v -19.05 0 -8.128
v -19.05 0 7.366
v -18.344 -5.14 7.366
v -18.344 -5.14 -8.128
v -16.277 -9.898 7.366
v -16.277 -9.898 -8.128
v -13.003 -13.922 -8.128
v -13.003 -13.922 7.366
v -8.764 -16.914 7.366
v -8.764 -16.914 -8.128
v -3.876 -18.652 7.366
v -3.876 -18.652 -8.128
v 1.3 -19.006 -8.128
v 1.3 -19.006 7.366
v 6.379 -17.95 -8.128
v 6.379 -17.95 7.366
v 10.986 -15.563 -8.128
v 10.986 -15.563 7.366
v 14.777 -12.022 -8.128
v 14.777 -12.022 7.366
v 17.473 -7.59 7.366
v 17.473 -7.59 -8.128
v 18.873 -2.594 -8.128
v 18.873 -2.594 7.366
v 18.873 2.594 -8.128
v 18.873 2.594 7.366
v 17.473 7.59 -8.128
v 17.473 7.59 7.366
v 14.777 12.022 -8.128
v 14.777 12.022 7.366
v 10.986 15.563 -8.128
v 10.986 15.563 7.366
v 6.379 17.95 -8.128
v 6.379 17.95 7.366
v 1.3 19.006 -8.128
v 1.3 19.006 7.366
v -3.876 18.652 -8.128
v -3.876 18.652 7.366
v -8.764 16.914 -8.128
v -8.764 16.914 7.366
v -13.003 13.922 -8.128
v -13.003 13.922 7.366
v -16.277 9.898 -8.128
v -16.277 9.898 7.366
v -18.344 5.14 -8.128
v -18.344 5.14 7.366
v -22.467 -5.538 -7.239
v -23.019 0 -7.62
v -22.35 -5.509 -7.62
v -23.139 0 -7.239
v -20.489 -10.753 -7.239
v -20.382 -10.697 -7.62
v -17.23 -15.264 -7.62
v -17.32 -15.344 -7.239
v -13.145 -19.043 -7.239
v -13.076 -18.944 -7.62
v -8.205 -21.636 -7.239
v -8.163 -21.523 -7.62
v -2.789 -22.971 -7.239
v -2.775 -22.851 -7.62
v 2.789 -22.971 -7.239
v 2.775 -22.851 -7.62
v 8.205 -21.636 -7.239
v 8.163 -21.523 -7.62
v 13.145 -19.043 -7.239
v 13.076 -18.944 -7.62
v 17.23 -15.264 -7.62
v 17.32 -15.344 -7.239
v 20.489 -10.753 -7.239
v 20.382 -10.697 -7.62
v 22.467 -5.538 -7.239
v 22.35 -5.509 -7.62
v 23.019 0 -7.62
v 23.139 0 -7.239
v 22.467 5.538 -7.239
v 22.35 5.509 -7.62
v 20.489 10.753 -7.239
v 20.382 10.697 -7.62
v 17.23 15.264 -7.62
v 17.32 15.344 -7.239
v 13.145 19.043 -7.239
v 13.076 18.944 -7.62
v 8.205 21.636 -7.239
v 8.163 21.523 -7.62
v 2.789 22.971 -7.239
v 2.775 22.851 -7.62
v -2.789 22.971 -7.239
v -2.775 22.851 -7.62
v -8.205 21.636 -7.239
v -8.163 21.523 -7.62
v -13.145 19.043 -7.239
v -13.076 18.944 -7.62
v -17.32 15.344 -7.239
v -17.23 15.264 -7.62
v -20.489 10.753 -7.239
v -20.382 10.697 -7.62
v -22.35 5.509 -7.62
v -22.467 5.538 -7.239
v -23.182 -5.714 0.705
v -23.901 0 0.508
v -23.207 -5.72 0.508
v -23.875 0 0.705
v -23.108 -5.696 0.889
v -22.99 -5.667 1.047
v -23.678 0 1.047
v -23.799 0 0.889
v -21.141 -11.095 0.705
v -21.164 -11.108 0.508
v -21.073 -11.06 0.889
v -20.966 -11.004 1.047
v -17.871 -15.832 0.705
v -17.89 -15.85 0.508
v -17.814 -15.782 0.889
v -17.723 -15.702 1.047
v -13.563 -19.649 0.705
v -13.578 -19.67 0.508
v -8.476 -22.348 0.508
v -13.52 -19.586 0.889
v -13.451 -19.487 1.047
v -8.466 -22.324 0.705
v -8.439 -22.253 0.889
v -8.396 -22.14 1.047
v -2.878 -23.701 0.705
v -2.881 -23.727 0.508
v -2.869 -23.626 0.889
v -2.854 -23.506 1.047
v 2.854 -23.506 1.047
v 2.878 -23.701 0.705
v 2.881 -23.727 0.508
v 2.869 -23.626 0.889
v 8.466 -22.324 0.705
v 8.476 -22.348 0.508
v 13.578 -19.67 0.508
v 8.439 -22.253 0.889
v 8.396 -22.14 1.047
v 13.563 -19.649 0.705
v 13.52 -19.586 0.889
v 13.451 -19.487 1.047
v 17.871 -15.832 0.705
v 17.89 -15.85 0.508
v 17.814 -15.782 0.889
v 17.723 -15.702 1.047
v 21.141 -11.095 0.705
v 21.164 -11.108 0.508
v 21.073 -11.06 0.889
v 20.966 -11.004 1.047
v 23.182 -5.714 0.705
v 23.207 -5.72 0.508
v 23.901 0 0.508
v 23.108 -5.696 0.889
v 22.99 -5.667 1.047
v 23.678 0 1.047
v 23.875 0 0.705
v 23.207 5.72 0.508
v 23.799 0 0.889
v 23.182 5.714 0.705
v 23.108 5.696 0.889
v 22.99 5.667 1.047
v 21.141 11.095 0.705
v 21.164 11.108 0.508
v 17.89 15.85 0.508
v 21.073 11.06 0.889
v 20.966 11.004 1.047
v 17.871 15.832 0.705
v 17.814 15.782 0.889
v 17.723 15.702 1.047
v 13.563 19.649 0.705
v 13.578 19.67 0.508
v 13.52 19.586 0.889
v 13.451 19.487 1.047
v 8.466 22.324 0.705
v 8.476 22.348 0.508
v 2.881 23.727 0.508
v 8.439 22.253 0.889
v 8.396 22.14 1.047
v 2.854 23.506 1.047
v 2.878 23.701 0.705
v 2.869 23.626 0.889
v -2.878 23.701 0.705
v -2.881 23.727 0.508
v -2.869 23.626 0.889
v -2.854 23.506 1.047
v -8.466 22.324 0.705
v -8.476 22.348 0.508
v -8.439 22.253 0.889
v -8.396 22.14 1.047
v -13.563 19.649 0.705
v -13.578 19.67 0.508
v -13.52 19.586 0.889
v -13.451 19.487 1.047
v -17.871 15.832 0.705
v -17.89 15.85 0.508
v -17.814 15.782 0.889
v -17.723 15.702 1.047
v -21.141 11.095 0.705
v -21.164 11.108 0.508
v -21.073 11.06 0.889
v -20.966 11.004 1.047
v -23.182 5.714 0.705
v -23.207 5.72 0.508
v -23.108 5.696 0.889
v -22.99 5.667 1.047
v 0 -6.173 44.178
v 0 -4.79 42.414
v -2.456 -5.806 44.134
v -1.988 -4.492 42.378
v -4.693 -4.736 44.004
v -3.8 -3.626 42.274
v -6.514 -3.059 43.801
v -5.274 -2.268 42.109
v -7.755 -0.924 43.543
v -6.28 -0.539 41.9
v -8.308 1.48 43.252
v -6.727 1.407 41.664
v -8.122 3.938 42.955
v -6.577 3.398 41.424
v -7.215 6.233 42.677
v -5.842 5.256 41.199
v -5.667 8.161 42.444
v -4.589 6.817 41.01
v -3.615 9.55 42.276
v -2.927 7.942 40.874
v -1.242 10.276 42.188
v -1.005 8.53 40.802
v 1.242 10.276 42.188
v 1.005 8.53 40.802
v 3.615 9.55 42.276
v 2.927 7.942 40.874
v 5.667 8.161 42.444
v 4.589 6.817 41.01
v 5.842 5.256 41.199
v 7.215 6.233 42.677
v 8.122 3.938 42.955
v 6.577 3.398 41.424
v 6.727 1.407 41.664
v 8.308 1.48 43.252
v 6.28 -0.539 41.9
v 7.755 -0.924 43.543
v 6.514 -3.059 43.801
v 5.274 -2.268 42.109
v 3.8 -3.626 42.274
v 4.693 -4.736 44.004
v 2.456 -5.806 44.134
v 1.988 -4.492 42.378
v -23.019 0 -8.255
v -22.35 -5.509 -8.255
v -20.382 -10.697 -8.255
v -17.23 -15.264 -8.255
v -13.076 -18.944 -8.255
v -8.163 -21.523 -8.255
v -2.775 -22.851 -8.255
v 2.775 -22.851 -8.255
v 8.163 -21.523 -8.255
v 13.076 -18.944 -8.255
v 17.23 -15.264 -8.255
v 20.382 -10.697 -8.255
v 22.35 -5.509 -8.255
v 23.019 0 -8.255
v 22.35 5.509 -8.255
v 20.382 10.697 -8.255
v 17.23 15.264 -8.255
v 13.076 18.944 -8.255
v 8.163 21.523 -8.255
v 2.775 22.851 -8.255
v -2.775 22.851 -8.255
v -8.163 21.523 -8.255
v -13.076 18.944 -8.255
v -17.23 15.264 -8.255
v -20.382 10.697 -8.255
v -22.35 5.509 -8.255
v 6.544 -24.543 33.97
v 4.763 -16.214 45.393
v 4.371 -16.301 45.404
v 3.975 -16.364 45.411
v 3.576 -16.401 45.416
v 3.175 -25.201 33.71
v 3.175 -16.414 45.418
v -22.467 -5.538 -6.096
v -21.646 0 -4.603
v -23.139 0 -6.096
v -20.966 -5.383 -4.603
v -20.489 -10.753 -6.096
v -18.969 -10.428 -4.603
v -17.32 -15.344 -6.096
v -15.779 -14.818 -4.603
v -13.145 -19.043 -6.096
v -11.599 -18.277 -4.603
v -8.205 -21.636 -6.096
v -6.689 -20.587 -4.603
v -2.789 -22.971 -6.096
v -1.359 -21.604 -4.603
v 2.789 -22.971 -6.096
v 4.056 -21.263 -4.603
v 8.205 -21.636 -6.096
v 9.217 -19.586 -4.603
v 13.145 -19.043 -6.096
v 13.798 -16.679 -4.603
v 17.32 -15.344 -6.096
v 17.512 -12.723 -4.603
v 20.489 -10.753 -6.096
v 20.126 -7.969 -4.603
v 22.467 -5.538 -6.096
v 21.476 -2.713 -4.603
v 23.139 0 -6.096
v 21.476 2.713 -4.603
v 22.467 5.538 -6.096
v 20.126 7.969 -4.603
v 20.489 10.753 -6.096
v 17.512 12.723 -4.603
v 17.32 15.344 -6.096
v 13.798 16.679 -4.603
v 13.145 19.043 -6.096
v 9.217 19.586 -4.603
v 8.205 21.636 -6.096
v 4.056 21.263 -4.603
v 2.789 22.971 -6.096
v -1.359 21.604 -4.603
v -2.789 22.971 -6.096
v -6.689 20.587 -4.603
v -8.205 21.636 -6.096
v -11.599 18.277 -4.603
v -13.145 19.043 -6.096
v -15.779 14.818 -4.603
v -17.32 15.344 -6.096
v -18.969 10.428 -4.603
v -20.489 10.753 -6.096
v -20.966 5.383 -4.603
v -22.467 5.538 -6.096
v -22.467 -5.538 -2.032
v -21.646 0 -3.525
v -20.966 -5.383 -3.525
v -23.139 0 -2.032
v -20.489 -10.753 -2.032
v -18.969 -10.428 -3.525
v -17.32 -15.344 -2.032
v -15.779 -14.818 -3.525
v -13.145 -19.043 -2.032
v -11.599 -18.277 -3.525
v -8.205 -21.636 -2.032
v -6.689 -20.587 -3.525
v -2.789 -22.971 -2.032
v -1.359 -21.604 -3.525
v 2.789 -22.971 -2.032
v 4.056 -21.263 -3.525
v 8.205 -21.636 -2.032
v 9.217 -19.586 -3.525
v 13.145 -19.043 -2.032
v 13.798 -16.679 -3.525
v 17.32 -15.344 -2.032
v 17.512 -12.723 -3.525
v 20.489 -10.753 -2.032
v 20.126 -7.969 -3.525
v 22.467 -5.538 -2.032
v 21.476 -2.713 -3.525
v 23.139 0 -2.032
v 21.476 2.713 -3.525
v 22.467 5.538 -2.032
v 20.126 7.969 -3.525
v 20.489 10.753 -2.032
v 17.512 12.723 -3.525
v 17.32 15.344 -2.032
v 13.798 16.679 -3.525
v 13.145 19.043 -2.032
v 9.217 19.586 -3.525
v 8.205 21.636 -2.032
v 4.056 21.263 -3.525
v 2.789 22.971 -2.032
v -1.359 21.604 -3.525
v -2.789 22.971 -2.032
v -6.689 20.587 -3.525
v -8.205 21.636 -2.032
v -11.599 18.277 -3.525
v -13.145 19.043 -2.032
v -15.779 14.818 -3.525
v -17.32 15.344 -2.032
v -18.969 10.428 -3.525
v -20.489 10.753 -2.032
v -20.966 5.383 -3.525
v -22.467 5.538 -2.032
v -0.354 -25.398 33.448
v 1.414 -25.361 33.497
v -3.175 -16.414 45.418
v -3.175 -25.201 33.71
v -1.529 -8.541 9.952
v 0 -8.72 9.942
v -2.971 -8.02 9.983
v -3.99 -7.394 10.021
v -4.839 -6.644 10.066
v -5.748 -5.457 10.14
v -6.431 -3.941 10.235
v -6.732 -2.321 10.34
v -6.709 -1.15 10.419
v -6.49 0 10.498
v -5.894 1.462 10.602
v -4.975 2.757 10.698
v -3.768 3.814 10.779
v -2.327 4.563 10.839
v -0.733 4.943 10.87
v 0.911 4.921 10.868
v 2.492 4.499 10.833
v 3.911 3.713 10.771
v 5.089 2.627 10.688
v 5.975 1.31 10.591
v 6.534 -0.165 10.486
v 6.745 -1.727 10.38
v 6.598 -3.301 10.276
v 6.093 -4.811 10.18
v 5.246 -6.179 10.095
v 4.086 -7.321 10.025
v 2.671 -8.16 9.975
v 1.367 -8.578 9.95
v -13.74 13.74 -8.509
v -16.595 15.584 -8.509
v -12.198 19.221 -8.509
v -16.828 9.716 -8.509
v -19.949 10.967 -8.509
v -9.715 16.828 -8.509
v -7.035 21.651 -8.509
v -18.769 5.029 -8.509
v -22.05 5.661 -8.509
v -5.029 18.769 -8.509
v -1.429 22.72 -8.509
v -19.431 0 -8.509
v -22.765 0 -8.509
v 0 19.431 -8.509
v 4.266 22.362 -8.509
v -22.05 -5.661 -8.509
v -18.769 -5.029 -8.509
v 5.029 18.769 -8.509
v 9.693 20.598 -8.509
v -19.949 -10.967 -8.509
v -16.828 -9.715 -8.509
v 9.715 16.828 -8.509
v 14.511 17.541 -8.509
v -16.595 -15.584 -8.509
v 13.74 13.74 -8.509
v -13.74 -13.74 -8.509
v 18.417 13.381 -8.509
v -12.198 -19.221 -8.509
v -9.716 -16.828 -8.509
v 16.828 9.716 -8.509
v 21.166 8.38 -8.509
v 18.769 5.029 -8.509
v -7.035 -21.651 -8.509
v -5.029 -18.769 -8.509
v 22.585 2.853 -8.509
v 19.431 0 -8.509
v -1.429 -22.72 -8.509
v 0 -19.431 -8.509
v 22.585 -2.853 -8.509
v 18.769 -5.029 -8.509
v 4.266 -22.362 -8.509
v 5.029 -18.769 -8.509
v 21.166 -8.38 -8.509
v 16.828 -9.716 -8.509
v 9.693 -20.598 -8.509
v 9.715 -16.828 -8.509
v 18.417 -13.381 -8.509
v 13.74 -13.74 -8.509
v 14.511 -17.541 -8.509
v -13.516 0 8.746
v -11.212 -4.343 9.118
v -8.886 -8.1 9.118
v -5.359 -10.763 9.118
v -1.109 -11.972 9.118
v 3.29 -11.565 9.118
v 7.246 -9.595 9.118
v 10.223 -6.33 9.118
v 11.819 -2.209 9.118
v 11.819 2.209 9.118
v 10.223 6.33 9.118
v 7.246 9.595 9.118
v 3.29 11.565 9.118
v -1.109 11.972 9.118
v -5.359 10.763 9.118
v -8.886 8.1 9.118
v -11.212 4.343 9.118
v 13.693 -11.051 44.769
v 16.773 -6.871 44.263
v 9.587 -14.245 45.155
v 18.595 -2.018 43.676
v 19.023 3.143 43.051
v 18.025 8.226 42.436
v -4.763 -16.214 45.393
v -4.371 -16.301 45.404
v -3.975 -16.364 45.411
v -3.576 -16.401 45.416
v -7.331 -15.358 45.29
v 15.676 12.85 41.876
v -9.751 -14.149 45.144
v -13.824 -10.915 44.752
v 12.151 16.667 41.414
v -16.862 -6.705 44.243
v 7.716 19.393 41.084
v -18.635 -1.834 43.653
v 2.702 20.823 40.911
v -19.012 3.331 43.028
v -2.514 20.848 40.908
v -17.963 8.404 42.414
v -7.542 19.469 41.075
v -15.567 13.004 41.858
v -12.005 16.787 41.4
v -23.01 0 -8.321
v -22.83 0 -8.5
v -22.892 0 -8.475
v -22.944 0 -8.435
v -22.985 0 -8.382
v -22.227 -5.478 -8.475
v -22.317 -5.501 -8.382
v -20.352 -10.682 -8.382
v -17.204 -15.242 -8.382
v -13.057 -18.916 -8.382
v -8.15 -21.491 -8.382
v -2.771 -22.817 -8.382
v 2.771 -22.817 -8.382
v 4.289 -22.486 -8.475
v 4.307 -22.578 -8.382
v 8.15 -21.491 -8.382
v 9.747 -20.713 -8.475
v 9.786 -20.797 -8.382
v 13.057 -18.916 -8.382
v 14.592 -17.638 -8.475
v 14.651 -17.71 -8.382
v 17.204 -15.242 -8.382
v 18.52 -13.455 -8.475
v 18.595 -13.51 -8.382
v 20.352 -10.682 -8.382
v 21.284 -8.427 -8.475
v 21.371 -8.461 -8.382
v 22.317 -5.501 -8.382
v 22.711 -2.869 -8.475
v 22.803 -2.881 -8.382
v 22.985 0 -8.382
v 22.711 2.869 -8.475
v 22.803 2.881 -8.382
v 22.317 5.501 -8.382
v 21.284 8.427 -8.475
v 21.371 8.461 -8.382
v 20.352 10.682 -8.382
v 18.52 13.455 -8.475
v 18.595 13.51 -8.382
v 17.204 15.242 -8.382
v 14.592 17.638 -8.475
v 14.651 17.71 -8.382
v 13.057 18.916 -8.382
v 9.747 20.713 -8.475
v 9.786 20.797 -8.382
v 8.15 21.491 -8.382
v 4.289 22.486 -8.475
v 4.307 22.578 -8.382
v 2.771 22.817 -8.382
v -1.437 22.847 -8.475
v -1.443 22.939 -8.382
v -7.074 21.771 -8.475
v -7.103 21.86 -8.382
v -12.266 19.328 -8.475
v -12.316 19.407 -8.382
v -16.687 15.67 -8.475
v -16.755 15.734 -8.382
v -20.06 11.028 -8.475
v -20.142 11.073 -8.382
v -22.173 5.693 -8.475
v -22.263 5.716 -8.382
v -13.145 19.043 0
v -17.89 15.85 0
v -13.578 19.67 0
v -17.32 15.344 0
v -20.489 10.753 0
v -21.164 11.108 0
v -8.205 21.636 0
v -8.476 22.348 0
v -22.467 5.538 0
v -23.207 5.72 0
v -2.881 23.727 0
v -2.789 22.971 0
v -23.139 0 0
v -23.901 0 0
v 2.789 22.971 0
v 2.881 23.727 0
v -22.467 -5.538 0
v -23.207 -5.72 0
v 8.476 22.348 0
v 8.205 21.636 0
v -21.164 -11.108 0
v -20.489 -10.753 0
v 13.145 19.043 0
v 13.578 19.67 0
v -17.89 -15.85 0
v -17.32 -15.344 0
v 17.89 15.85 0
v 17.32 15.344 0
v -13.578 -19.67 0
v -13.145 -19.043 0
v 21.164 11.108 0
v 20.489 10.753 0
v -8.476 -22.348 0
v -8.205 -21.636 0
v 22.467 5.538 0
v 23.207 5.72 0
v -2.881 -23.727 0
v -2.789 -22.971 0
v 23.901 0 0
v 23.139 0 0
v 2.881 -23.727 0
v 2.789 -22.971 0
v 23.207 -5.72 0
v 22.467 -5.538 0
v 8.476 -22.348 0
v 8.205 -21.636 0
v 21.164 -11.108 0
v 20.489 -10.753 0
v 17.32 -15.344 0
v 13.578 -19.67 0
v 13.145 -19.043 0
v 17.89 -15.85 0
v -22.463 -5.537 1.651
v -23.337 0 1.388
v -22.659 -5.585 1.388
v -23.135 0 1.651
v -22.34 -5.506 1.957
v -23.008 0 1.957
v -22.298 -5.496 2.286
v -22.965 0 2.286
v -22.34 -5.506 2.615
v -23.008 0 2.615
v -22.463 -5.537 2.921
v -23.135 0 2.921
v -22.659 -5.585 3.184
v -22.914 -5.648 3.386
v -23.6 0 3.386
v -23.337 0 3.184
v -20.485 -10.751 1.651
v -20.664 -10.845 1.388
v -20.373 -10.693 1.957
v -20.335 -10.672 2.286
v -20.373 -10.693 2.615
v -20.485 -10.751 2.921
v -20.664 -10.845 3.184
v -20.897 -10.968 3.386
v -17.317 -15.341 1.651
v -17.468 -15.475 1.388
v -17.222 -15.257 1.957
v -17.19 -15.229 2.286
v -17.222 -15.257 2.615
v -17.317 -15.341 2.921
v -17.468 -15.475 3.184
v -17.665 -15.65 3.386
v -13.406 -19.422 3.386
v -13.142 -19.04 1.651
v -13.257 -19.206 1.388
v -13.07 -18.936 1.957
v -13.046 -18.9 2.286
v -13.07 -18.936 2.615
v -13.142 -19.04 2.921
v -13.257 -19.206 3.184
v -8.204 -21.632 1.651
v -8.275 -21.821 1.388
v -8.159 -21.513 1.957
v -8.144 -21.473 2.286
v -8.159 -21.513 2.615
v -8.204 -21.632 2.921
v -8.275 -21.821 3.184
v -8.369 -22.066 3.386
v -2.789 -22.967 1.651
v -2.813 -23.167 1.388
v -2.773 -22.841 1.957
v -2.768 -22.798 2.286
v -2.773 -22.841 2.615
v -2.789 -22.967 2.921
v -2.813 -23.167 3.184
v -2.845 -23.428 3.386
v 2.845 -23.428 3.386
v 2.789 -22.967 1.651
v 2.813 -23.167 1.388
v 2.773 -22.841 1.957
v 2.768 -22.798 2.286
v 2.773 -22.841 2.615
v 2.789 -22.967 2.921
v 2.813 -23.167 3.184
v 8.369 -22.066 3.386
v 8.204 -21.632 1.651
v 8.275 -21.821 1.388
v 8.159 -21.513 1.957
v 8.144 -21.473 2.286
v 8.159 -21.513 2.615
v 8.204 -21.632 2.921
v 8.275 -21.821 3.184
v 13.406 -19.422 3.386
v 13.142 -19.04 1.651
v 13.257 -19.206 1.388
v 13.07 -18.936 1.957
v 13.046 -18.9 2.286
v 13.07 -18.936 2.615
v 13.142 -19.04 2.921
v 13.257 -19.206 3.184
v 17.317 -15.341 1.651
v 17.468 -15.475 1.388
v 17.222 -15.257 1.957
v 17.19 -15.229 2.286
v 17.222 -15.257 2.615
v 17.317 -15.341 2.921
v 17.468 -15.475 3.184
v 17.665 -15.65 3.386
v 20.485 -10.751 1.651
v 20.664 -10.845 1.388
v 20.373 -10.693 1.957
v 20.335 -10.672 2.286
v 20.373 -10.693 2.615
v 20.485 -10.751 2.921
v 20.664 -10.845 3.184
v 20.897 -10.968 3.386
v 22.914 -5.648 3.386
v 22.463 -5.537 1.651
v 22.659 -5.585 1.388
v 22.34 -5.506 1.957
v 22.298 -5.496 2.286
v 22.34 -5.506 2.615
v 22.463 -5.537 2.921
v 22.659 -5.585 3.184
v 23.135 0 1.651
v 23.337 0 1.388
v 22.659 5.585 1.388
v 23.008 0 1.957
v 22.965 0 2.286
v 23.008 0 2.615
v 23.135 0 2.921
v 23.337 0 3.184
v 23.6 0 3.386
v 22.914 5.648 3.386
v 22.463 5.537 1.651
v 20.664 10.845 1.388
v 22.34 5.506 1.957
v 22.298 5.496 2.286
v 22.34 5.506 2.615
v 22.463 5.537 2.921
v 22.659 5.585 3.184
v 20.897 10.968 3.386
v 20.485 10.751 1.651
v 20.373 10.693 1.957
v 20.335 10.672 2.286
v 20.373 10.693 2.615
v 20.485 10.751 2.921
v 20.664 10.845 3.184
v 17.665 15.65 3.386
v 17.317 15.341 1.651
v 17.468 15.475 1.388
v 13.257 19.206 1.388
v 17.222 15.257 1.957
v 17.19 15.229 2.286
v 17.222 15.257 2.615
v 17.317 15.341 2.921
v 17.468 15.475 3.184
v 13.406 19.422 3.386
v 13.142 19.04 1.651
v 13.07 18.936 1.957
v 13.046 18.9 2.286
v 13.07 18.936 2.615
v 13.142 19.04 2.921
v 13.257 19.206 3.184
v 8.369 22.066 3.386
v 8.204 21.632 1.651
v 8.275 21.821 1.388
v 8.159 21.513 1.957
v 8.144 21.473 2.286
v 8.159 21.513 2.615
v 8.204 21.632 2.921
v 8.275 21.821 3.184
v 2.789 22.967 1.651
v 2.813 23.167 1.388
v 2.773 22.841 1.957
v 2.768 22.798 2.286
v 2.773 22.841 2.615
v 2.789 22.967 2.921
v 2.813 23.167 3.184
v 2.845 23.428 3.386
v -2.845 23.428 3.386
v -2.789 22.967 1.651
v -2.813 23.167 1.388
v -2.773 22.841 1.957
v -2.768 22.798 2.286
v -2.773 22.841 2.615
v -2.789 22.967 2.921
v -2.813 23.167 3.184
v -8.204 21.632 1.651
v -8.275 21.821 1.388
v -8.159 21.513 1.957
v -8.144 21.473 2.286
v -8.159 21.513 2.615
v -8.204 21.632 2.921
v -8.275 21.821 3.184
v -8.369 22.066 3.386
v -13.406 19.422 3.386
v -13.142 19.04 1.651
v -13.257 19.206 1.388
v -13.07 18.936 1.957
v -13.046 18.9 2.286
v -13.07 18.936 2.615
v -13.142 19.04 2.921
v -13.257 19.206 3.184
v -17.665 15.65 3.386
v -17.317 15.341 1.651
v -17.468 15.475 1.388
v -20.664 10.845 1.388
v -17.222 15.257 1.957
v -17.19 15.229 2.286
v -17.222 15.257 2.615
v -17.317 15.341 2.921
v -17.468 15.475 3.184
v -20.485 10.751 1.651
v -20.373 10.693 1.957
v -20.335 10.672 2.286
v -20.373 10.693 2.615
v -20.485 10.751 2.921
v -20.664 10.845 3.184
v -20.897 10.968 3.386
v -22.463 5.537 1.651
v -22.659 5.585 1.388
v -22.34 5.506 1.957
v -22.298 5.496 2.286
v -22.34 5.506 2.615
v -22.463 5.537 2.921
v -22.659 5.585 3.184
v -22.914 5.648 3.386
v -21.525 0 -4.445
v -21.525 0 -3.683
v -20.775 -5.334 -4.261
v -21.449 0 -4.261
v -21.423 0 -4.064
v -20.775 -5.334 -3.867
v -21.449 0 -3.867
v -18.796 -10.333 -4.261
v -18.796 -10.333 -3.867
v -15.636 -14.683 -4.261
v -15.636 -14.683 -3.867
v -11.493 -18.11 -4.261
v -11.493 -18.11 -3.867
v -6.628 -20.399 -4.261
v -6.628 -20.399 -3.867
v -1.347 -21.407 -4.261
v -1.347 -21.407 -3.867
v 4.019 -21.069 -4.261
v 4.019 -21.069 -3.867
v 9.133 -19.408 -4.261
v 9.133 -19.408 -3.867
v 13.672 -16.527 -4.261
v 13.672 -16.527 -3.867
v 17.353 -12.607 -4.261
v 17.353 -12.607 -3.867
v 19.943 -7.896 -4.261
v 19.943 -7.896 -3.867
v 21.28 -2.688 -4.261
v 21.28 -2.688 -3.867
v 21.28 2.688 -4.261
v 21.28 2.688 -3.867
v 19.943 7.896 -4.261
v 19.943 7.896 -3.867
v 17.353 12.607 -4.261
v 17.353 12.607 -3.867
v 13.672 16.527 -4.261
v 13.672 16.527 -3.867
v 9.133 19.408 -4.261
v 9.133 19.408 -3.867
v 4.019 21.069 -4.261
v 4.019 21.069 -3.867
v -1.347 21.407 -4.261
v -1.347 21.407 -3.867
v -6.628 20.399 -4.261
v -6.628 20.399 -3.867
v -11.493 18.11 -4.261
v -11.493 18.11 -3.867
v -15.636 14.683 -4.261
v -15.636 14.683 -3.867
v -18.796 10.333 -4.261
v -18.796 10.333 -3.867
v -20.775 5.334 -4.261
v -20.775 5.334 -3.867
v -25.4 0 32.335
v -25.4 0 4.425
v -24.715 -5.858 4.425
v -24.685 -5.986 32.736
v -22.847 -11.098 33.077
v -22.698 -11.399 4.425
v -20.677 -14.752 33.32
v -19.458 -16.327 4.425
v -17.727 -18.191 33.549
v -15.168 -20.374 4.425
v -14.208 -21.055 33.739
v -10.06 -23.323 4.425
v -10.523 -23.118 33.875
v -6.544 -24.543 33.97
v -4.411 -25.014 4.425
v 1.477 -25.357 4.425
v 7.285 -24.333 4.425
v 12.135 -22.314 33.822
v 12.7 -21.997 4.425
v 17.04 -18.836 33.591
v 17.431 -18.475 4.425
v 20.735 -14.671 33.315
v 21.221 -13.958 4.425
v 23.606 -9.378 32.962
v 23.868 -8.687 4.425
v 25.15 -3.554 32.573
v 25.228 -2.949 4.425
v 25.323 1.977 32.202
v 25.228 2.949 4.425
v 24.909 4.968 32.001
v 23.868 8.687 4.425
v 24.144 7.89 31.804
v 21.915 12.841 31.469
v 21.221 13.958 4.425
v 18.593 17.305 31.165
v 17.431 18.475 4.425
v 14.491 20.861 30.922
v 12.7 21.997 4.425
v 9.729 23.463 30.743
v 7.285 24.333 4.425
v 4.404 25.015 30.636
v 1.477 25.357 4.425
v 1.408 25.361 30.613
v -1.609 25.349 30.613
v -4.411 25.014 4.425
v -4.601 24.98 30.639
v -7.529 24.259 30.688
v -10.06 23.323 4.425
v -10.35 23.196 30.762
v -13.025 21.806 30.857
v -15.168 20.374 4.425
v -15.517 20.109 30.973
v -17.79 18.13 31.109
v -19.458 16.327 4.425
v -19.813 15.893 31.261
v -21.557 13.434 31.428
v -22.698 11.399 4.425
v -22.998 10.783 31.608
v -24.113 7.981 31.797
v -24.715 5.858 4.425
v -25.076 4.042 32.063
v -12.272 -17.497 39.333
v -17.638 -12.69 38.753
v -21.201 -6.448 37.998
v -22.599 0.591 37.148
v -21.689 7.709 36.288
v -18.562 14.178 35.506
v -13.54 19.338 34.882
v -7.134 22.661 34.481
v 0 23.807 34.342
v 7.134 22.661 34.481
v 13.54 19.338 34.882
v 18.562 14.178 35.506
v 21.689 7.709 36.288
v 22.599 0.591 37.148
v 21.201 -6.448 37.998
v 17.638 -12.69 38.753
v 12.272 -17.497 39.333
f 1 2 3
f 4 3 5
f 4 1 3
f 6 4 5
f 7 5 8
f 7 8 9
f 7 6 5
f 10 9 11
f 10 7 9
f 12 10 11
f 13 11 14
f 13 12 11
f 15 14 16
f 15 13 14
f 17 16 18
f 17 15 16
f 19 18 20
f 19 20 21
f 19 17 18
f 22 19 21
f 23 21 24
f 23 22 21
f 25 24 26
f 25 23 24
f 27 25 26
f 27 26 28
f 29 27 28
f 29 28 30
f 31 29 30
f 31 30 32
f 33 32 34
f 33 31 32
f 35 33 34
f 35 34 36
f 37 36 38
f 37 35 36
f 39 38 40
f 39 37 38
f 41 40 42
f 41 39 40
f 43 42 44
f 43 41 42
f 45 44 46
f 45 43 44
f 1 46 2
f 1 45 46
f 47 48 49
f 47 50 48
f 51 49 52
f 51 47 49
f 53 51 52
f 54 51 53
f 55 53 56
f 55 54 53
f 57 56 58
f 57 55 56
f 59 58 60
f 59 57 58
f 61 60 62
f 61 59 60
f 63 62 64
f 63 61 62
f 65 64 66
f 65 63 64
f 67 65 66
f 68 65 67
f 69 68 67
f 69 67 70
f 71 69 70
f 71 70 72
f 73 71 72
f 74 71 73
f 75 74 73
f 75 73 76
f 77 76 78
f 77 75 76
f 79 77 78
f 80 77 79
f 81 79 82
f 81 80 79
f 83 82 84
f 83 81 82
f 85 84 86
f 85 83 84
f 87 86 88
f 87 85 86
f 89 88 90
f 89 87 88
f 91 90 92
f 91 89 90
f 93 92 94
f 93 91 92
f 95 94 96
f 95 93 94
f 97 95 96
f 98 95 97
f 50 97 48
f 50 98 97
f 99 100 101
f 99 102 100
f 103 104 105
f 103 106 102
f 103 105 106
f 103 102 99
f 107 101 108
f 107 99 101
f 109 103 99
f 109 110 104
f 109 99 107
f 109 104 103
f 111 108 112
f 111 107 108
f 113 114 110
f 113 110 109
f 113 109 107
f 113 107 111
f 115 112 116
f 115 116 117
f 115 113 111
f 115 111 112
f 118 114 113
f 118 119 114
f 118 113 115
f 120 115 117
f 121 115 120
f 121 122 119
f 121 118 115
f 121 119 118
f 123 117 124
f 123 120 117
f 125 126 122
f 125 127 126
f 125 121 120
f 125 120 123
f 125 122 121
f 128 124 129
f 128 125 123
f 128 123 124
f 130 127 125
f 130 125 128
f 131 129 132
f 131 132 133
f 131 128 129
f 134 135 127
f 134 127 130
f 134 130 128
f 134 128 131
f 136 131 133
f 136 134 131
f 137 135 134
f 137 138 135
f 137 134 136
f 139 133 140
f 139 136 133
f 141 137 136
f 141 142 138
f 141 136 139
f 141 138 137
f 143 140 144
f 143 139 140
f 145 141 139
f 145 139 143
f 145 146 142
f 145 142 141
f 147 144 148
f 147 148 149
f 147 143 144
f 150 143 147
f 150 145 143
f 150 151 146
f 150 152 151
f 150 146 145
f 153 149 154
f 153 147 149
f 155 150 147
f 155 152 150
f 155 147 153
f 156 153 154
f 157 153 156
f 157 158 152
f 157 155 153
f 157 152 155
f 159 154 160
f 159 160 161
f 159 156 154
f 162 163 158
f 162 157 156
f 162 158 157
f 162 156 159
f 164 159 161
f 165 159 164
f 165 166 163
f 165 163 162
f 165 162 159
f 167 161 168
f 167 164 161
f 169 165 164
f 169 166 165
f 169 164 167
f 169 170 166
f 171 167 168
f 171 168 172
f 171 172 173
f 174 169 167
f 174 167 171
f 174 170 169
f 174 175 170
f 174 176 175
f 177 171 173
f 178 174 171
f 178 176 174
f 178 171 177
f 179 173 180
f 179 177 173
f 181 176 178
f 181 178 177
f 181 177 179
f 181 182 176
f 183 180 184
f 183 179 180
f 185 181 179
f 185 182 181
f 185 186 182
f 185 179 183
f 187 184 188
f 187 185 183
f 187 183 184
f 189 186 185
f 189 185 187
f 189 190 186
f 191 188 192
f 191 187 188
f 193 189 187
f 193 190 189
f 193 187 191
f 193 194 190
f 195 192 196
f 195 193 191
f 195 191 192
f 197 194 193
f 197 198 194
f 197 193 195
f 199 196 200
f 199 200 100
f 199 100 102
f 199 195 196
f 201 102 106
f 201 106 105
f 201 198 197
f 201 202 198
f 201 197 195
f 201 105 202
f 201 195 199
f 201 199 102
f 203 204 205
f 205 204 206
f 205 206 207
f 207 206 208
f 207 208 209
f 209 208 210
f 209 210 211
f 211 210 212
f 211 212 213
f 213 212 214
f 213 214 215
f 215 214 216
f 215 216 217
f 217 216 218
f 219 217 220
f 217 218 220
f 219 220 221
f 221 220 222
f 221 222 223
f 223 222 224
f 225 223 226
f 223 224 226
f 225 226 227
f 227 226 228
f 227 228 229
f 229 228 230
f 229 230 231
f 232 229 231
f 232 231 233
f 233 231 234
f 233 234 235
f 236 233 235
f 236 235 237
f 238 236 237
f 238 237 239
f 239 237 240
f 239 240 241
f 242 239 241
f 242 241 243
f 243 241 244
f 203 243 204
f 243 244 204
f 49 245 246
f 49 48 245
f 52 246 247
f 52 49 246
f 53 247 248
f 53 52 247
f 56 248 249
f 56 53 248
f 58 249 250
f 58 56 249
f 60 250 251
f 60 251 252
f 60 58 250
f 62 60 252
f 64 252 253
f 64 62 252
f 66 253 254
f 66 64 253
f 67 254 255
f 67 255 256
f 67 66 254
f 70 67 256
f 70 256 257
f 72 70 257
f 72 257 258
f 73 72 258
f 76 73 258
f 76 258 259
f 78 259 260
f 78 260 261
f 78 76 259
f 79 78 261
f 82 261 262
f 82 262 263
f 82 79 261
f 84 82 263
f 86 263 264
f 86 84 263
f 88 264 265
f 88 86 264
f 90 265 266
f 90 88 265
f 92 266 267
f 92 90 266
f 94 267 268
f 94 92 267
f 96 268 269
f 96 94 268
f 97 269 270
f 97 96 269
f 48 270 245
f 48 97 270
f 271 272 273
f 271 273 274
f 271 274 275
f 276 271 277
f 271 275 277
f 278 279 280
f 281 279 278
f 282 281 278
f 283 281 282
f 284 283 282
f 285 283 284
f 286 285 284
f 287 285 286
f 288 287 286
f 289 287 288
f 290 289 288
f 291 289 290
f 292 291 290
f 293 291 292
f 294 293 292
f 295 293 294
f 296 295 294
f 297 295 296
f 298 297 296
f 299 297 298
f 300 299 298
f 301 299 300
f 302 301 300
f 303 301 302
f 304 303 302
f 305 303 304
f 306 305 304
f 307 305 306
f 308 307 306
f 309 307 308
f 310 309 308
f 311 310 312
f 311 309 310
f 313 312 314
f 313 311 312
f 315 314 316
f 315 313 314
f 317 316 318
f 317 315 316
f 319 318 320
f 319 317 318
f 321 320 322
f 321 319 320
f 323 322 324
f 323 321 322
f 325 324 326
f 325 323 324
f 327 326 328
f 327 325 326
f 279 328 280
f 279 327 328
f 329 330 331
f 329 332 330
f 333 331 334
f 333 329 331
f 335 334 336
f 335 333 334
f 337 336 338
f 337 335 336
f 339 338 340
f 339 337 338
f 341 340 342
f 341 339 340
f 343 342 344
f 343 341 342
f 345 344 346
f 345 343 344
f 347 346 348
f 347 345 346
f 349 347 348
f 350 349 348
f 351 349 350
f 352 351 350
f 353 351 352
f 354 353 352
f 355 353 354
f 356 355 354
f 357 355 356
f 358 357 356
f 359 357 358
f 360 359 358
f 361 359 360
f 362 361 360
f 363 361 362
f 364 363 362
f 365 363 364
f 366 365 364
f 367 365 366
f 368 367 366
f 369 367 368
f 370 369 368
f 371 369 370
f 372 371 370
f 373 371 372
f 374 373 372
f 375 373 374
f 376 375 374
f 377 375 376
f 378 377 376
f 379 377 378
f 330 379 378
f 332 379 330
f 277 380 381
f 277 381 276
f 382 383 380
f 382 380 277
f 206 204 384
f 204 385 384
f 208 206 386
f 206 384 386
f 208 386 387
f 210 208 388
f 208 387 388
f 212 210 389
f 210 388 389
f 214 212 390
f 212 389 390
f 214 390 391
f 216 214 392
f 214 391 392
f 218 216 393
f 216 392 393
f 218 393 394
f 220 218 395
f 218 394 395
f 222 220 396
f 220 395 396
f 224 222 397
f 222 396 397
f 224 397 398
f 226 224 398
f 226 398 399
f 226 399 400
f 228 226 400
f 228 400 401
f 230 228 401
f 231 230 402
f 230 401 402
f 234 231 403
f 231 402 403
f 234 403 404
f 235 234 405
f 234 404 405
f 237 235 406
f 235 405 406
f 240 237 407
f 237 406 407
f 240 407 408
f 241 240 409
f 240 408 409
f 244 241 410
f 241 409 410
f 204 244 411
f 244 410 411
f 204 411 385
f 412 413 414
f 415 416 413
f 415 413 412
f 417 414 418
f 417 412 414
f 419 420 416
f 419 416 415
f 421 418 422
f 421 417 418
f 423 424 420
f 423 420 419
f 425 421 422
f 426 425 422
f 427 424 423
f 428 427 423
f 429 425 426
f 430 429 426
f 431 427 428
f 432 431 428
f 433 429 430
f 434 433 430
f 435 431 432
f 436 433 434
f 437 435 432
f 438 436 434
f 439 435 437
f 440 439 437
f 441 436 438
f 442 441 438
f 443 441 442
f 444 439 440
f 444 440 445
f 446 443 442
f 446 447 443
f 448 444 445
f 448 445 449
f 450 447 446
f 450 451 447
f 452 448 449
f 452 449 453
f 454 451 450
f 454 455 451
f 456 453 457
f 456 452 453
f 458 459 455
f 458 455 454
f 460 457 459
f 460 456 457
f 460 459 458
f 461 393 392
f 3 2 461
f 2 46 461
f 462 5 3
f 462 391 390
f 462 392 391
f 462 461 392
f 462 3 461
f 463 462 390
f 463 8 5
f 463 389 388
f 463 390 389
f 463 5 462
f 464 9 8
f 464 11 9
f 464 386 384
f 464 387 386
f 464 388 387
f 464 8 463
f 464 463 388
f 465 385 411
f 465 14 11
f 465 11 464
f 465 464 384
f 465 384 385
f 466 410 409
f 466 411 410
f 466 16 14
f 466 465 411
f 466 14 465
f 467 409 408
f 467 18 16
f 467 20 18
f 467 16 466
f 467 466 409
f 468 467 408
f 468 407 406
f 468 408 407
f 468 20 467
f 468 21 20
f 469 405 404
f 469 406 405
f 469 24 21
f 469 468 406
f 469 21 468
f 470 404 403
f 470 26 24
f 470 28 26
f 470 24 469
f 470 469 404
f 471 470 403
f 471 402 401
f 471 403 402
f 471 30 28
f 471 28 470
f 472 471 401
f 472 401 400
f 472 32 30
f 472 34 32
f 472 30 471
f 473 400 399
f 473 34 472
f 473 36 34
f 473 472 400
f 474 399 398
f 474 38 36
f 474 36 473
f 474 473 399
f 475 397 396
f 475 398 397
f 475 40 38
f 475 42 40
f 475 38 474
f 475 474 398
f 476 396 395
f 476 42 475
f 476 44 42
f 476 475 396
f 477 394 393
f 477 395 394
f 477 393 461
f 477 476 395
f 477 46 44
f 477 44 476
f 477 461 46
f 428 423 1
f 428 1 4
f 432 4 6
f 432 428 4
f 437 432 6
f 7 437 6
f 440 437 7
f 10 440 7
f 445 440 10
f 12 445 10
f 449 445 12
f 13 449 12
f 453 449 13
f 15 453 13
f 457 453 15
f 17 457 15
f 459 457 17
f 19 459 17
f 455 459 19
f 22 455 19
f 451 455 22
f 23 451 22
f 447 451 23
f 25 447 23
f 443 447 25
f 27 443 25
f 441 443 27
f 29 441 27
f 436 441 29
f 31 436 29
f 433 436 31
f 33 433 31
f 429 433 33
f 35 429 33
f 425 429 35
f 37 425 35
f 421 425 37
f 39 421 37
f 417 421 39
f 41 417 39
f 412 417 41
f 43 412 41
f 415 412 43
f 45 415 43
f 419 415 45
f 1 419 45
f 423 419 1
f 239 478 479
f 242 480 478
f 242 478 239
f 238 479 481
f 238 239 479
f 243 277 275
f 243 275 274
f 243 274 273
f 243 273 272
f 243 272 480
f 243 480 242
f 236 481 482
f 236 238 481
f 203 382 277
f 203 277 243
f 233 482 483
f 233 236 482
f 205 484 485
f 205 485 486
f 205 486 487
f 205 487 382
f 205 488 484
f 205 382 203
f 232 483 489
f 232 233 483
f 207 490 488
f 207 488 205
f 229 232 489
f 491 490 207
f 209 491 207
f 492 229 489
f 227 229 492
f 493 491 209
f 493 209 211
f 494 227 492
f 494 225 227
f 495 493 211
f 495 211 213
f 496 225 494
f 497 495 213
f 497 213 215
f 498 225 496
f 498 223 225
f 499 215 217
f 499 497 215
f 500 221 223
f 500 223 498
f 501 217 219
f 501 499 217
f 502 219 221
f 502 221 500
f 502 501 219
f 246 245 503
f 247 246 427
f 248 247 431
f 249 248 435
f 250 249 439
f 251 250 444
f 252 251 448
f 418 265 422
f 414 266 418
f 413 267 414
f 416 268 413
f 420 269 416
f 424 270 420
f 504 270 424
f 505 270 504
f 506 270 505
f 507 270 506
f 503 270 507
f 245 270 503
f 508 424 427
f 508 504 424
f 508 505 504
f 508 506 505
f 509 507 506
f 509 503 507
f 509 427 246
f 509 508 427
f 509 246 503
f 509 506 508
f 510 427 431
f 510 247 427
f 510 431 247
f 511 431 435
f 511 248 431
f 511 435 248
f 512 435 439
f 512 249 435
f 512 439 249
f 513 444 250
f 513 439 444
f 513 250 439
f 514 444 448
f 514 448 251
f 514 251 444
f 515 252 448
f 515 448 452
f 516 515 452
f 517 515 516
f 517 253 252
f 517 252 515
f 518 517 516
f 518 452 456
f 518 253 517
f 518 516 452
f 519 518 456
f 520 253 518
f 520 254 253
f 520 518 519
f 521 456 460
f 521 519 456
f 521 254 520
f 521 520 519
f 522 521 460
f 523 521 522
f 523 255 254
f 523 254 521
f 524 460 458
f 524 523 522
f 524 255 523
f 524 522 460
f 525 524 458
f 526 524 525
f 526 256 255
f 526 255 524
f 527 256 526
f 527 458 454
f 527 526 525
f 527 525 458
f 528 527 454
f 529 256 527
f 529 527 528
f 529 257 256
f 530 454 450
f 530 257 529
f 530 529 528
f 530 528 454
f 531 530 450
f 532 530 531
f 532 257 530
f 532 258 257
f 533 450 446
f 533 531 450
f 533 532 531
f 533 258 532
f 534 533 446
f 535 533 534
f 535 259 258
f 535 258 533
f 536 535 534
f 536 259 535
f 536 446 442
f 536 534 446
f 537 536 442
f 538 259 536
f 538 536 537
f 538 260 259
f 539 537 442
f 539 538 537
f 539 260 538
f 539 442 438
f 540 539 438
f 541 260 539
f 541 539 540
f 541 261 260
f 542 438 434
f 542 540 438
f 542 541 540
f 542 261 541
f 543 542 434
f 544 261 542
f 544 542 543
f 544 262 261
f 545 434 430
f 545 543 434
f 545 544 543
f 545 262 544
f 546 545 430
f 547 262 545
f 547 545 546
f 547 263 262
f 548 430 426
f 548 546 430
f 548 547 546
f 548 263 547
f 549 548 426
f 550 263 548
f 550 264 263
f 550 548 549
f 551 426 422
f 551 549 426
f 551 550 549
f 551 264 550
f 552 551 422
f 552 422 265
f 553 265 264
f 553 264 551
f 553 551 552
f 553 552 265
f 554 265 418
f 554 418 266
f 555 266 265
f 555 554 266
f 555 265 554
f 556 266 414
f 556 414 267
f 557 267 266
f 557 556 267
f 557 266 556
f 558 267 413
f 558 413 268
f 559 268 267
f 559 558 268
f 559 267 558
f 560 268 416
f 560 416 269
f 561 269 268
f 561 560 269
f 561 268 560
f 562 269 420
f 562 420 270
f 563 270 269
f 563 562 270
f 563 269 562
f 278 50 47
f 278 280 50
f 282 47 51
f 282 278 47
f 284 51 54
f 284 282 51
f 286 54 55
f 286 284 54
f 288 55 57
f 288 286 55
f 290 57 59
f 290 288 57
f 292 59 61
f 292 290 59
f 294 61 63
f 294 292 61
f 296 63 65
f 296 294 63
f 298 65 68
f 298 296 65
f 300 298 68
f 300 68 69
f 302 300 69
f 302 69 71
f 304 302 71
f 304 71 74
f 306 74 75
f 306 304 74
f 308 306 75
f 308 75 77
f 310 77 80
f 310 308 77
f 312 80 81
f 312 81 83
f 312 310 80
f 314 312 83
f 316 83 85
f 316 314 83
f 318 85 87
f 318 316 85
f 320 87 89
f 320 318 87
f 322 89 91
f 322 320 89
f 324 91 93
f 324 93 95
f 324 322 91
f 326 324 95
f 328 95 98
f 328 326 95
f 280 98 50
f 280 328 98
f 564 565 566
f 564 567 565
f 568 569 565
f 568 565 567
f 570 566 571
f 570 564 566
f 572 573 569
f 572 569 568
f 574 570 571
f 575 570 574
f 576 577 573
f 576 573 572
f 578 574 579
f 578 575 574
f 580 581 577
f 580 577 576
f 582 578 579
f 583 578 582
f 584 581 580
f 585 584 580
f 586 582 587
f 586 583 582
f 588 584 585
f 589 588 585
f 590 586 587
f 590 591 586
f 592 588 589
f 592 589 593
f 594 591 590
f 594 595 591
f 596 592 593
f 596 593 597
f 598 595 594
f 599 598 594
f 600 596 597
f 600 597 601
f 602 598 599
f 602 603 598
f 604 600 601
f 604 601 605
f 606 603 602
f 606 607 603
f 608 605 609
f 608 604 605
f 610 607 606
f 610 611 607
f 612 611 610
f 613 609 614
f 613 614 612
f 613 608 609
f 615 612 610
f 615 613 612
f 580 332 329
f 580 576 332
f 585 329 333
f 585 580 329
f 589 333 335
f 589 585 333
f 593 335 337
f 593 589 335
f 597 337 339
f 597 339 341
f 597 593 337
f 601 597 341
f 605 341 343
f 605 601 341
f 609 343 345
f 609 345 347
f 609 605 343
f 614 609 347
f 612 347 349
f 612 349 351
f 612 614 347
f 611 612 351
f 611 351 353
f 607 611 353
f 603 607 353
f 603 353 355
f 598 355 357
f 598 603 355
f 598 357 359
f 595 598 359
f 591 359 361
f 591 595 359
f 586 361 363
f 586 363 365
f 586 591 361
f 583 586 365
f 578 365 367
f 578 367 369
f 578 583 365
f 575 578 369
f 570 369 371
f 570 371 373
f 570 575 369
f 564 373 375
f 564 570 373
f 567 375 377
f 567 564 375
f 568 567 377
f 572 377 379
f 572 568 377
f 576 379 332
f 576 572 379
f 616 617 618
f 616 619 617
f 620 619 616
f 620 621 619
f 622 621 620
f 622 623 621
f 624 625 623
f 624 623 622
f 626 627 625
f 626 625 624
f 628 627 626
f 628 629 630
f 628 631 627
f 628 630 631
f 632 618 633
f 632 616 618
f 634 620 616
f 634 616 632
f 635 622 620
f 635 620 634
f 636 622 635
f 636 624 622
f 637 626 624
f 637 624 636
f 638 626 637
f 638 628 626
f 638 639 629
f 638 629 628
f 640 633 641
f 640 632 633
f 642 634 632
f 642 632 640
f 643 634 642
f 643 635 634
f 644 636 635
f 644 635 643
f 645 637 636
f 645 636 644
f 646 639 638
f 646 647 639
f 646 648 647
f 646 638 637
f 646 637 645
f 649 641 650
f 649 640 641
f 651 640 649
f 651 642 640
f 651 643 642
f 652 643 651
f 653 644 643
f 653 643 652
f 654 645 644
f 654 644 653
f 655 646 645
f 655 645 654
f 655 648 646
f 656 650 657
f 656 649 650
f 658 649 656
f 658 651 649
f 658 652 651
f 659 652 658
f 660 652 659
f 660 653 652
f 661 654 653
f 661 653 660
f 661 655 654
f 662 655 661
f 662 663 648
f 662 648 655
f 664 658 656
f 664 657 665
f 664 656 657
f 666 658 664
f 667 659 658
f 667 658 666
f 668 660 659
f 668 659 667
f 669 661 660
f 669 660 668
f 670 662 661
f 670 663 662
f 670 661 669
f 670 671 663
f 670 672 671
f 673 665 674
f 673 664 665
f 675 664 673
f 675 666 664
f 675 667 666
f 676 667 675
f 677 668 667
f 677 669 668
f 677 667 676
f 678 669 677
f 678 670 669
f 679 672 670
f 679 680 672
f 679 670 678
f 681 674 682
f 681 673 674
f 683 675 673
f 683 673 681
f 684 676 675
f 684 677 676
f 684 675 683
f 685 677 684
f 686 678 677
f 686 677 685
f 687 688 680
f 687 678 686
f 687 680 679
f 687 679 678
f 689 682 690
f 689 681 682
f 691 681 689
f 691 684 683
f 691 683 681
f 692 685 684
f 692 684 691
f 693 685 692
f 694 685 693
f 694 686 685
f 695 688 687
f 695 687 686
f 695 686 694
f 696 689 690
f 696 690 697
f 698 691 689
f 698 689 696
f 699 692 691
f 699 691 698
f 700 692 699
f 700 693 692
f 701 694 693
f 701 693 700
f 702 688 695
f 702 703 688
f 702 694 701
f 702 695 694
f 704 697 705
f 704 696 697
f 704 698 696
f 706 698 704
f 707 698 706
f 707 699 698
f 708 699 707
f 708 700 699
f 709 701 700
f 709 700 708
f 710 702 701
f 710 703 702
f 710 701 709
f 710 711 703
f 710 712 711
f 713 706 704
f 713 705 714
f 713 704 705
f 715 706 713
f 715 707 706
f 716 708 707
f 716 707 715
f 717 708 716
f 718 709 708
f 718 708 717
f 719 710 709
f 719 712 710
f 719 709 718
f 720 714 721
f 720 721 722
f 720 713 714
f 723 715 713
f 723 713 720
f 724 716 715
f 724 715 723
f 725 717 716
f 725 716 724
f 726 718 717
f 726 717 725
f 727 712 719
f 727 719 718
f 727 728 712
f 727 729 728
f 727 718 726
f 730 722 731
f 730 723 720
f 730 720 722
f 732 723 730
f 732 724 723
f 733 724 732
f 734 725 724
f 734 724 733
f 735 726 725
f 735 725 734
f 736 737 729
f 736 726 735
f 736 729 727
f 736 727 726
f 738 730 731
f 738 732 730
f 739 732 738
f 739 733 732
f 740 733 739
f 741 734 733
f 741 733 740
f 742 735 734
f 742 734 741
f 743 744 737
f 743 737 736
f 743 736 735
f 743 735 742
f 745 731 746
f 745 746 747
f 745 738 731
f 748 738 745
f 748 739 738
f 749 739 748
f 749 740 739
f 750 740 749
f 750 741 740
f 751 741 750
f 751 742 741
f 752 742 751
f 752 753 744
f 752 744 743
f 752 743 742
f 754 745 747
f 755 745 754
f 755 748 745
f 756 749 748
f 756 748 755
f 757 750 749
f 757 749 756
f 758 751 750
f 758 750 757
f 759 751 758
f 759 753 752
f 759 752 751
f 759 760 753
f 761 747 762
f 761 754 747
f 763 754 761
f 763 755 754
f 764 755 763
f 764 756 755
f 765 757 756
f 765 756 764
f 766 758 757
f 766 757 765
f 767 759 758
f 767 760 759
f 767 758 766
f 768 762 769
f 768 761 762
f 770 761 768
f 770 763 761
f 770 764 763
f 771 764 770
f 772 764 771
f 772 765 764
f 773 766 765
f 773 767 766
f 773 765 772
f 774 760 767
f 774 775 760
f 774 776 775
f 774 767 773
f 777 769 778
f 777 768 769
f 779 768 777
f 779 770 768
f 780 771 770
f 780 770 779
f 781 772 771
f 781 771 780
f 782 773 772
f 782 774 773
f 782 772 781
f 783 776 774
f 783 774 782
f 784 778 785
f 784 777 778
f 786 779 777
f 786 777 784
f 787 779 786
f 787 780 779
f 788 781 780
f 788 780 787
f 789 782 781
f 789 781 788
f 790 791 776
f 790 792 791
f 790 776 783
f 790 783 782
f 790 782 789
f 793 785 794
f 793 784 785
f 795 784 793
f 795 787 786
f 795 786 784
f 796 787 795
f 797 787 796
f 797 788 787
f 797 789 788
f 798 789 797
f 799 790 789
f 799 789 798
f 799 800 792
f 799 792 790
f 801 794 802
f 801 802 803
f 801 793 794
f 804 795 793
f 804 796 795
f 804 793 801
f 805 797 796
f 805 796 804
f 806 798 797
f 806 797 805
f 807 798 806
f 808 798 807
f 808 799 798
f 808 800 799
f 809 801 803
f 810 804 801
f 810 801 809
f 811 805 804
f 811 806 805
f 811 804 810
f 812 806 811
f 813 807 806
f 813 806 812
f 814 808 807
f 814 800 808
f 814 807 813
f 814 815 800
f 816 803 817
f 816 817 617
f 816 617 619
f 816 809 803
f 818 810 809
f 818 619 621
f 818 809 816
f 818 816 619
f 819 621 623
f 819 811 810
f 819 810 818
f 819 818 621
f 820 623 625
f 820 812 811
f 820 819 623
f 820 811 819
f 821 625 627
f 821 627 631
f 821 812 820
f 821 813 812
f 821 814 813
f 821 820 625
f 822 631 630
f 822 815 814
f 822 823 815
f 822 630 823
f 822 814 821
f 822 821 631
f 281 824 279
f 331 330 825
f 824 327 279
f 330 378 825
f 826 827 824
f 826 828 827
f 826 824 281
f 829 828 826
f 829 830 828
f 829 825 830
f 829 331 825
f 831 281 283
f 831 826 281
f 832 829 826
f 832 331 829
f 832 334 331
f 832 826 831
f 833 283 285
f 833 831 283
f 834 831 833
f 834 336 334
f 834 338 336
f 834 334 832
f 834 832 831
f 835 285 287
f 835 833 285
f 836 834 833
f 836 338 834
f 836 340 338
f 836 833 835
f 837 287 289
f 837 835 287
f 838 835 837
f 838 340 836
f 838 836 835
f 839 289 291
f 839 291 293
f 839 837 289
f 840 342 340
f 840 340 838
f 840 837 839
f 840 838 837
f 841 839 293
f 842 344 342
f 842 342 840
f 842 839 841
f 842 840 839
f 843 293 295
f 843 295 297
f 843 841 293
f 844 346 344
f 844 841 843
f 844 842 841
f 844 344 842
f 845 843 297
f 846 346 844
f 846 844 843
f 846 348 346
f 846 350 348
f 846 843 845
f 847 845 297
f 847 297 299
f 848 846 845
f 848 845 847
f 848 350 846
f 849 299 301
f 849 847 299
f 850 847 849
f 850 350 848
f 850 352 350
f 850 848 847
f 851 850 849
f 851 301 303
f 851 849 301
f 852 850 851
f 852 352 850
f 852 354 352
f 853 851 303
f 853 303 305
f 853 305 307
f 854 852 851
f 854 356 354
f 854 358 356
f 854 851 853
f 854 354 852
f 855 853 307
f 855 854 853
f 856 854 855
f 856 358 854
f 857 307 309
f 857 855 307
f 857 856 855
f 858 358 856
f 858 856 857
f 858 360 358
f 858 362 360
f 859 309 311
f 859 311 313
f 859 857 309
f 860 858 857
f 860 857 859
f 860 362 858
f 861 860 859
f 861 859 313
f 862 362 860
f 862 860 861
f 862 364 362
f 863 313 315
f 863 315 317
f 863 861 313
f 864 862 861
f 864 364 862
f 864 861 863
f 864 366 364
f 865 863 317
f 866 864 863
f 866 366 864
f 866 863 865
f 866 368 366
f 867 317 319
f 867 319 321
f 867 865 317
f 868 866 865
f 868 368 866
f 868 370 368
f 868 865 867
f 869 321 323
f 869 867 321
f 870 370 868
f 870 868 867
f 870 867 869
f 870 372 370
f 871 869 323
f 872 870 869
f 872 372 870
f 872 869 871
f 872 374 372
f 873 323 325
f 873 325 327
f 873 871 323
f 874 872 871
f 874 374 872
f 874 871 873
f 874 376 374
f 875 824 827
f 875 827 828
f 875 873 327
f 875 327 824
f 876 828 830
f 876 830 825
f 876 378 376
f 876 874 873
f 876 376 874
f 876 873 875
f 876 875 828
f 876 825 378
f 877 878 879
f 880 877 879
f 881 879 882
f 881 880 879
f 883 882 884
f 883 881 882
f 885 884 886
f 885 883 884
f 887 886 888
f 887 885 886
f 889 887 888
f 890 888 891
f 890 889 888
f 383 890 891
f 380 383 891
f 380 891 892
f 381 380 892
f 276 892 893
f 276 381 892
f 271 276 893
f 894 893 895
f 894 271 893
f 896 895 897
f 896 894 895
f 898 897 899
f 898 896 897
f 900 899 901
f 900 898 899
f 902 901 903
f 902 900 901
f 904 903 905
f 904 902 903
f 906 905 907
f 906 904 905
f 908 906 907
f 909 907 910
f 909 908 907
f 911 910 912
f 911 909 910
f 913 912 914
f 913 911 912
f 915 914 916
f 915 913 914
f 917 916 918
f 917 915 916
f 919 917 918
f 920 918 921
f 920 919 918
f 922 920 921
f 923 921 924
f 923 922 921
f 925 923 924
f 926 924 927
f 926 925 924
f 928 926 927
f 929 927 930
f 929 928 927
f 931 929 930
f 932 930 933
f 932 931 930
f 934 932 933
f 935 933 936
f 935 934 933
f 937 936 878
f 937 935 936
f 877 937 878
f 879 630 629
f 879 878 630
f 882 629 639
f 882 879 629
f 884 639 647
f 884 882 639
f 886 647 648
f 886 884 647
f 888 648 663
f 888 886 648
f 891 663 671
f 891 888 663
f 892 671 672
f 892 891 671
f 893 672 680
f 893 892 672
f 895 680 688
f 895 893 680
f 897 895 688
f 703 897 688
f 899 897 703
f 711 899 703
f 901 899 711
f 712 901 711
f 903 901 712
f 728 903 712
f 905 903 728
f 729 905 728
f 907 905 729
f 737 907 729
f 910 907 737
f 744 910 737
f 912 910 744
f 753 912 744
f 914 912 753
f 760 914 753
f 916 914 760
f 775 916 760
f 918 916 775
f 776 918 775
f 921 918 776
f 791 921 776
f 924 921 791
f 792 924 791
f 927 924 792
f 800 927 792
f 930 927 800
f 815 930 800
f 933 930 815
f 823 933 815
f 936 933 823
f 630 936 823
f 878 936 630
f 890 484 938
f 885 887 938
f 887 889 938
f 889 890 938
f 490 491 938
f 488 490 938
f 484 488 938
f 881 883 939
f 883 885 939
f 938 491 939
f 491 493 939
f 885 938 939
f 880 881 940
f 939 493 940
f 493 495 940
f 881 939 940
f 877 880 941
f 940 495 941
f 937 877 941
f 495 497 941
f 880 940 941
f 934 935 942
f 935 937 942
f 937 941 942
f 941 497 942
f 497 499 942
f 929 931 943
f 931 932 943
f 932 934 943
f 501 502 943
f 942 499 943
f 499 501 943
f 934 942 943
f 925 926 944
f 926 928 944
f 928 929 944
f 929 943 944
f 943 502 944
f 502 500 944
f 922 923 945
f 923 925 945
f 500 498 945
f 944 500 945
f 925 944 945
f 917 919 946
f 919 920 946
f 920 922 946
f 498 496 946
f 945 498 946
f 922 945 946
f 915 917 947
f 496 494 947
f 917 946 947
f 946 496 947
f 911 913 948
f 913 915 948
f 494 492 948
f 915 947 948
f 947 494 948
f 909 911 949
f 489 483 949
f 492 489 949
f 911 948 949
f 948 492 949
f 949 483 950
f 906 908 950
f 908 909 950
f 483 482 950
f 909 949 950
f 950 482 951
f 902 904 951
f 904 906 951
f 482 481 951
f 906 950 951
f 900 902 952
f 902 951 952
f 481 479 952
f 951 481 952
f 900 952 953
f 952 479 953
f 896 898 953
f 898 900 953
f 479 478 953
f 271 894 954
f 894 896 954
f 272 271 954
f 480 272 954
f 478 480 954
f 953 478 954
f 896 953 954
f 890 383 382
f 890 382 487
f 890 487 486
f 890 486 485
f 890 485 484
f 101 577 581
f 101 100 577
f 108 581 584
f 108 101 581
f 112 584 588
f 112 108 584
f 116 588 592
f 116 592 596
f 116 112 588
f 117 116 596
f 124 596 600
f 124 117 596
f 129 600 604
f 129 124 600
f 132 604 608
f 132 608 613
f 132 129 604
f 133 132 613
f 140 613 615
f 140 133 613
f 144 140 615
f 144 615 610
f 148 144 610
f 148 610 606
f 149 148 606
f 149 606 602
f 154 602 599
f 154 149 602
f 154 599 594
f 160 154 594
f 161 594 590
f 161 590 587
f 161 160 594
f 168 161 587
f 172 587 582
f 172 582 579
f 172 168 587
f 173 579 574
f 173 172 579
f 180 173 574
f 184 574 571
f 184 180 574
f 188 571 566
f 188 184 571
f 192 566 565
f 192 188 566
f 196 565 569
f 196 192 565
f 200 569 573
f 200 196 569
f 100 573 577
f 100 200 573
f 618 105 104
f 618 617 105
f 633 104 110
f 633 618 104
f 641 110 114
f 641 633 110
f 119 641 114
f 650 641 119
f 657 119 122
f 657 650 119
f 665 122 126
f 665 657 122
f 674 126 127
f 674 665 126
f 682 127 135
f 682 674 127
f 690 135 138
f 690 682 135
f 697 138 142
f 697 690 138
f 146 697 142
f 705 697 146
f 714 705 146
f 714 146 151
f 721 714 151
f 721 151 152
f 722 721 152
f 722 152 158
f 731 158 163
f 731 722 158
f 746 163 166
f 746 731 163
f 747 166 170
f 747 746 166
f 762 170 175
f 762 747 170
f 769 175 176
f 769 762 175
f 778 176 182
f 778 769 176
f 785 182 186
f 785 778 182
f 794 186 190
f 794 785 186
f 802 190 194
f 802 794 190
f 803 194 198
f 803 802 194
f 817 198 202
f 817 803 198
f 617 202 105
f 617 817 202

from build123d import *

# Parameters (mm, degrees)
FCE_00_TRIM_END_DEPTH             = 58.943741301
FCE_00_TRIM_END_DEPTH_BACK        = 58.943741301
F_5_8_11_TAPPED_HOLE1_D           = 13.49248
F_5_8_11_TAPPED_HOLE1_DEPTH       = 40.1193
F_5_8_11_TAPPED_HOLE1_CSINK_D     = 16.6624
F_5_8_11_TAPPED_HOLE1_CSINK_ANGLE = 90
F_5_8_11_TAPPED_HOLE1_TIP         = 4.053549943
FCH_00_CHAMFER_0_015_SIZE         = 0.381


with BuildPart() as part:
    # Sketch3 → FBR-00 Basic blank revolve. (revolve)
    with BuildSketch(Plane(origin=(0, 0, 0), x_dir=(0, 0, -1), z_dir=(1, 0, 0)), mode=Mode.PRIVATE) as fbr_00_basic_blank_revolve_sk:
        with BuildLine():
            Line((-45.466, 0), (-12.115698454, 0))
            Line((-12.115698454, 0), (-7.366, 19.05))
            Line((-7.366, 19.05), (8.509, 19.05))
            Line((8.509, 19.05), (8.509, 22.76475))
            ThreePointArc((8.509, 22.76475), (8.434605122, 22.944355122), (8.255, 23.01875))
            Line((8.255, 23.01875), (7.62, 23.01875))
            Line((7.62, 23.01875), (7.239, 23.1394))
            Line((7.239, 23.1394), (6.096, 23.1394))
            Line((6.096, 23.1394), (4.602815367, 21.646215367))
            ThreePointArc((4.602815367, 21.646215367), (4.064, 21.423030735), (3.525184633, 21.646215367))
            Line((3.525184633, 21.646215367), (2.032, 23.1394))
            Line((2.032, 23.1394), (0, 23.1394))
            Line((0, 23.1394), (0, 23.9014))
            Line((0, 23.9014), (-0.508, 23.9014))
            ThreePointArc((-0.508, 23.9014), (-0.799604775, 23.843396204), (-1.046815367, 23.678215367))
            Line((-1.046815367, 23.678215367), (-1.387974388, 23.337056347))
            ThreePointArc((-1.387974388, 23.337056347), (-2.451768264, 22.975946985), (-3.385852263, 23.600081959))
            Line((-3.385852263, 23.600081959), (-4.425035428, 25.4))
            Line((-4.425035428, 25.4), (-45.466, 25.4))
            Line((-45.466, 25.4), (-45.466, 0))
        make_face()
    revolve(fbr_00_basic_blank_revolve_sk.sketch.rotate(Axis((0, 0, -27.766671499), (0, 0, 1)), 90), axis=Axis((0, 0, -27.766671499), (0, 0, 1)))

    # Sketch19 → FCE-00 Trim end. (cut, two sides: drawn at the far end of the back side and taken through both)
    with BuildSketch(Plane(origin=(0, 0, 0), x_dir=(0, 0, -1), z_dir=(1, 0, 0)).offset(-FCE_00_TRIM_END_DEPTH_BACK)):
        Polygon((-68.346920588, -205.891877202), (-47.536496087, -33.923795537), (-39.26053446, 34.465066253), (-18.450109959, 206.433147918), (-362.38627329, 248.05399692), (-412.283083919, -164.271028201), align=None)
    extrude(amount=FCE_00_TRIM_END_DEPTH + FCE_00_TRIM_END_DEPTH_BACK, mode=Mode.SUBTRACT)

    # 5/8-11 Tapped Hole1
    with Locations(Plane(origin=(0, 2.097889548, 43.17739322), x_dir=(0, 0.992757341929, -0.120136838835), z_dir=(0, 0.120136838835, 0.992757341929))):
        with Locations((0, 0)):
            CounterSinkHole(F_5_8_11_TAPPED_HOLE1_D / 2, F_5_8_11_TAPPED_HOLE1_CSINK_D / 2, depth=F_5_8_11_TAPPED_HOLE1_DEPTH, counter_sink_angle=F_5_8_11_TAPPED_HOLE1_CSINK_ANGLE)
            with Locations((0, 0, -(F_5_8_11_TAPPED_HOLE1_DEPTH + F_5_8_11_TAPPED_HOLE1_TIP / 2))):  # 118° drill point
                Cone(0, F_5_8_11_TAPPED_HOLE1_D / 2, F_5_8_11_TAPPED_HOLE1_TIP, mode=Mode.SUBTRACT)

    # FCS-00 Bevel.: sweep along a path in Sketch22
    with BuildLine(Plane(origin=(0, -16.814137816, 45.466), x_dir=(-1, 0, 0), z_dir=(0, -0.11996356816283467, -0.9927782946426865))) as fcs_00_bevel_path:
        Line((-3.175, 0.403277876), (3.175, 0.403277876))
        ThreePointArc((3.175, 0.403277876), (3.975127257, 0.453889304), (4.7625, 0.604916814))
        ThreePointArc((4.7625, 0.604916814), (0, 38.1), (-4.7625, 0.604916814))
        ThreePointArc((-4.7625, 0.604916814), (-3.975127257, 0.453889304), (-3.175, 0.403277876))
    # Sketch31 → FCS-00 Bevel. (sweep, cut)
    with BuildSketch(Plane(origin=(0, 0, 0), x_dir=(0, 0, -1), z_dir=(1, 0, 0))):
        Polygon((-46.883705055, -15.313405584), (-11.697696067, -41.722206608), (-12.459464725, -48.026348779), (-50.284317751, -43.455736832), align=None)
    sweep(path=fcs_00_bevel_path.line, mode=Mode.SUBTRACT)

    # FCH-00 Chamfer 0.015
    fch_00_chamfer_0_015_edges = [part.edges().sort_by_distance(p)[0] for p in [
        (19.05, 0, -8.509),
    ]]
    chamfer(fch_00_chamfer_0_015_edges, length=FCH_00_CHAMFER_0_015_SIZE)


solid = part.part
